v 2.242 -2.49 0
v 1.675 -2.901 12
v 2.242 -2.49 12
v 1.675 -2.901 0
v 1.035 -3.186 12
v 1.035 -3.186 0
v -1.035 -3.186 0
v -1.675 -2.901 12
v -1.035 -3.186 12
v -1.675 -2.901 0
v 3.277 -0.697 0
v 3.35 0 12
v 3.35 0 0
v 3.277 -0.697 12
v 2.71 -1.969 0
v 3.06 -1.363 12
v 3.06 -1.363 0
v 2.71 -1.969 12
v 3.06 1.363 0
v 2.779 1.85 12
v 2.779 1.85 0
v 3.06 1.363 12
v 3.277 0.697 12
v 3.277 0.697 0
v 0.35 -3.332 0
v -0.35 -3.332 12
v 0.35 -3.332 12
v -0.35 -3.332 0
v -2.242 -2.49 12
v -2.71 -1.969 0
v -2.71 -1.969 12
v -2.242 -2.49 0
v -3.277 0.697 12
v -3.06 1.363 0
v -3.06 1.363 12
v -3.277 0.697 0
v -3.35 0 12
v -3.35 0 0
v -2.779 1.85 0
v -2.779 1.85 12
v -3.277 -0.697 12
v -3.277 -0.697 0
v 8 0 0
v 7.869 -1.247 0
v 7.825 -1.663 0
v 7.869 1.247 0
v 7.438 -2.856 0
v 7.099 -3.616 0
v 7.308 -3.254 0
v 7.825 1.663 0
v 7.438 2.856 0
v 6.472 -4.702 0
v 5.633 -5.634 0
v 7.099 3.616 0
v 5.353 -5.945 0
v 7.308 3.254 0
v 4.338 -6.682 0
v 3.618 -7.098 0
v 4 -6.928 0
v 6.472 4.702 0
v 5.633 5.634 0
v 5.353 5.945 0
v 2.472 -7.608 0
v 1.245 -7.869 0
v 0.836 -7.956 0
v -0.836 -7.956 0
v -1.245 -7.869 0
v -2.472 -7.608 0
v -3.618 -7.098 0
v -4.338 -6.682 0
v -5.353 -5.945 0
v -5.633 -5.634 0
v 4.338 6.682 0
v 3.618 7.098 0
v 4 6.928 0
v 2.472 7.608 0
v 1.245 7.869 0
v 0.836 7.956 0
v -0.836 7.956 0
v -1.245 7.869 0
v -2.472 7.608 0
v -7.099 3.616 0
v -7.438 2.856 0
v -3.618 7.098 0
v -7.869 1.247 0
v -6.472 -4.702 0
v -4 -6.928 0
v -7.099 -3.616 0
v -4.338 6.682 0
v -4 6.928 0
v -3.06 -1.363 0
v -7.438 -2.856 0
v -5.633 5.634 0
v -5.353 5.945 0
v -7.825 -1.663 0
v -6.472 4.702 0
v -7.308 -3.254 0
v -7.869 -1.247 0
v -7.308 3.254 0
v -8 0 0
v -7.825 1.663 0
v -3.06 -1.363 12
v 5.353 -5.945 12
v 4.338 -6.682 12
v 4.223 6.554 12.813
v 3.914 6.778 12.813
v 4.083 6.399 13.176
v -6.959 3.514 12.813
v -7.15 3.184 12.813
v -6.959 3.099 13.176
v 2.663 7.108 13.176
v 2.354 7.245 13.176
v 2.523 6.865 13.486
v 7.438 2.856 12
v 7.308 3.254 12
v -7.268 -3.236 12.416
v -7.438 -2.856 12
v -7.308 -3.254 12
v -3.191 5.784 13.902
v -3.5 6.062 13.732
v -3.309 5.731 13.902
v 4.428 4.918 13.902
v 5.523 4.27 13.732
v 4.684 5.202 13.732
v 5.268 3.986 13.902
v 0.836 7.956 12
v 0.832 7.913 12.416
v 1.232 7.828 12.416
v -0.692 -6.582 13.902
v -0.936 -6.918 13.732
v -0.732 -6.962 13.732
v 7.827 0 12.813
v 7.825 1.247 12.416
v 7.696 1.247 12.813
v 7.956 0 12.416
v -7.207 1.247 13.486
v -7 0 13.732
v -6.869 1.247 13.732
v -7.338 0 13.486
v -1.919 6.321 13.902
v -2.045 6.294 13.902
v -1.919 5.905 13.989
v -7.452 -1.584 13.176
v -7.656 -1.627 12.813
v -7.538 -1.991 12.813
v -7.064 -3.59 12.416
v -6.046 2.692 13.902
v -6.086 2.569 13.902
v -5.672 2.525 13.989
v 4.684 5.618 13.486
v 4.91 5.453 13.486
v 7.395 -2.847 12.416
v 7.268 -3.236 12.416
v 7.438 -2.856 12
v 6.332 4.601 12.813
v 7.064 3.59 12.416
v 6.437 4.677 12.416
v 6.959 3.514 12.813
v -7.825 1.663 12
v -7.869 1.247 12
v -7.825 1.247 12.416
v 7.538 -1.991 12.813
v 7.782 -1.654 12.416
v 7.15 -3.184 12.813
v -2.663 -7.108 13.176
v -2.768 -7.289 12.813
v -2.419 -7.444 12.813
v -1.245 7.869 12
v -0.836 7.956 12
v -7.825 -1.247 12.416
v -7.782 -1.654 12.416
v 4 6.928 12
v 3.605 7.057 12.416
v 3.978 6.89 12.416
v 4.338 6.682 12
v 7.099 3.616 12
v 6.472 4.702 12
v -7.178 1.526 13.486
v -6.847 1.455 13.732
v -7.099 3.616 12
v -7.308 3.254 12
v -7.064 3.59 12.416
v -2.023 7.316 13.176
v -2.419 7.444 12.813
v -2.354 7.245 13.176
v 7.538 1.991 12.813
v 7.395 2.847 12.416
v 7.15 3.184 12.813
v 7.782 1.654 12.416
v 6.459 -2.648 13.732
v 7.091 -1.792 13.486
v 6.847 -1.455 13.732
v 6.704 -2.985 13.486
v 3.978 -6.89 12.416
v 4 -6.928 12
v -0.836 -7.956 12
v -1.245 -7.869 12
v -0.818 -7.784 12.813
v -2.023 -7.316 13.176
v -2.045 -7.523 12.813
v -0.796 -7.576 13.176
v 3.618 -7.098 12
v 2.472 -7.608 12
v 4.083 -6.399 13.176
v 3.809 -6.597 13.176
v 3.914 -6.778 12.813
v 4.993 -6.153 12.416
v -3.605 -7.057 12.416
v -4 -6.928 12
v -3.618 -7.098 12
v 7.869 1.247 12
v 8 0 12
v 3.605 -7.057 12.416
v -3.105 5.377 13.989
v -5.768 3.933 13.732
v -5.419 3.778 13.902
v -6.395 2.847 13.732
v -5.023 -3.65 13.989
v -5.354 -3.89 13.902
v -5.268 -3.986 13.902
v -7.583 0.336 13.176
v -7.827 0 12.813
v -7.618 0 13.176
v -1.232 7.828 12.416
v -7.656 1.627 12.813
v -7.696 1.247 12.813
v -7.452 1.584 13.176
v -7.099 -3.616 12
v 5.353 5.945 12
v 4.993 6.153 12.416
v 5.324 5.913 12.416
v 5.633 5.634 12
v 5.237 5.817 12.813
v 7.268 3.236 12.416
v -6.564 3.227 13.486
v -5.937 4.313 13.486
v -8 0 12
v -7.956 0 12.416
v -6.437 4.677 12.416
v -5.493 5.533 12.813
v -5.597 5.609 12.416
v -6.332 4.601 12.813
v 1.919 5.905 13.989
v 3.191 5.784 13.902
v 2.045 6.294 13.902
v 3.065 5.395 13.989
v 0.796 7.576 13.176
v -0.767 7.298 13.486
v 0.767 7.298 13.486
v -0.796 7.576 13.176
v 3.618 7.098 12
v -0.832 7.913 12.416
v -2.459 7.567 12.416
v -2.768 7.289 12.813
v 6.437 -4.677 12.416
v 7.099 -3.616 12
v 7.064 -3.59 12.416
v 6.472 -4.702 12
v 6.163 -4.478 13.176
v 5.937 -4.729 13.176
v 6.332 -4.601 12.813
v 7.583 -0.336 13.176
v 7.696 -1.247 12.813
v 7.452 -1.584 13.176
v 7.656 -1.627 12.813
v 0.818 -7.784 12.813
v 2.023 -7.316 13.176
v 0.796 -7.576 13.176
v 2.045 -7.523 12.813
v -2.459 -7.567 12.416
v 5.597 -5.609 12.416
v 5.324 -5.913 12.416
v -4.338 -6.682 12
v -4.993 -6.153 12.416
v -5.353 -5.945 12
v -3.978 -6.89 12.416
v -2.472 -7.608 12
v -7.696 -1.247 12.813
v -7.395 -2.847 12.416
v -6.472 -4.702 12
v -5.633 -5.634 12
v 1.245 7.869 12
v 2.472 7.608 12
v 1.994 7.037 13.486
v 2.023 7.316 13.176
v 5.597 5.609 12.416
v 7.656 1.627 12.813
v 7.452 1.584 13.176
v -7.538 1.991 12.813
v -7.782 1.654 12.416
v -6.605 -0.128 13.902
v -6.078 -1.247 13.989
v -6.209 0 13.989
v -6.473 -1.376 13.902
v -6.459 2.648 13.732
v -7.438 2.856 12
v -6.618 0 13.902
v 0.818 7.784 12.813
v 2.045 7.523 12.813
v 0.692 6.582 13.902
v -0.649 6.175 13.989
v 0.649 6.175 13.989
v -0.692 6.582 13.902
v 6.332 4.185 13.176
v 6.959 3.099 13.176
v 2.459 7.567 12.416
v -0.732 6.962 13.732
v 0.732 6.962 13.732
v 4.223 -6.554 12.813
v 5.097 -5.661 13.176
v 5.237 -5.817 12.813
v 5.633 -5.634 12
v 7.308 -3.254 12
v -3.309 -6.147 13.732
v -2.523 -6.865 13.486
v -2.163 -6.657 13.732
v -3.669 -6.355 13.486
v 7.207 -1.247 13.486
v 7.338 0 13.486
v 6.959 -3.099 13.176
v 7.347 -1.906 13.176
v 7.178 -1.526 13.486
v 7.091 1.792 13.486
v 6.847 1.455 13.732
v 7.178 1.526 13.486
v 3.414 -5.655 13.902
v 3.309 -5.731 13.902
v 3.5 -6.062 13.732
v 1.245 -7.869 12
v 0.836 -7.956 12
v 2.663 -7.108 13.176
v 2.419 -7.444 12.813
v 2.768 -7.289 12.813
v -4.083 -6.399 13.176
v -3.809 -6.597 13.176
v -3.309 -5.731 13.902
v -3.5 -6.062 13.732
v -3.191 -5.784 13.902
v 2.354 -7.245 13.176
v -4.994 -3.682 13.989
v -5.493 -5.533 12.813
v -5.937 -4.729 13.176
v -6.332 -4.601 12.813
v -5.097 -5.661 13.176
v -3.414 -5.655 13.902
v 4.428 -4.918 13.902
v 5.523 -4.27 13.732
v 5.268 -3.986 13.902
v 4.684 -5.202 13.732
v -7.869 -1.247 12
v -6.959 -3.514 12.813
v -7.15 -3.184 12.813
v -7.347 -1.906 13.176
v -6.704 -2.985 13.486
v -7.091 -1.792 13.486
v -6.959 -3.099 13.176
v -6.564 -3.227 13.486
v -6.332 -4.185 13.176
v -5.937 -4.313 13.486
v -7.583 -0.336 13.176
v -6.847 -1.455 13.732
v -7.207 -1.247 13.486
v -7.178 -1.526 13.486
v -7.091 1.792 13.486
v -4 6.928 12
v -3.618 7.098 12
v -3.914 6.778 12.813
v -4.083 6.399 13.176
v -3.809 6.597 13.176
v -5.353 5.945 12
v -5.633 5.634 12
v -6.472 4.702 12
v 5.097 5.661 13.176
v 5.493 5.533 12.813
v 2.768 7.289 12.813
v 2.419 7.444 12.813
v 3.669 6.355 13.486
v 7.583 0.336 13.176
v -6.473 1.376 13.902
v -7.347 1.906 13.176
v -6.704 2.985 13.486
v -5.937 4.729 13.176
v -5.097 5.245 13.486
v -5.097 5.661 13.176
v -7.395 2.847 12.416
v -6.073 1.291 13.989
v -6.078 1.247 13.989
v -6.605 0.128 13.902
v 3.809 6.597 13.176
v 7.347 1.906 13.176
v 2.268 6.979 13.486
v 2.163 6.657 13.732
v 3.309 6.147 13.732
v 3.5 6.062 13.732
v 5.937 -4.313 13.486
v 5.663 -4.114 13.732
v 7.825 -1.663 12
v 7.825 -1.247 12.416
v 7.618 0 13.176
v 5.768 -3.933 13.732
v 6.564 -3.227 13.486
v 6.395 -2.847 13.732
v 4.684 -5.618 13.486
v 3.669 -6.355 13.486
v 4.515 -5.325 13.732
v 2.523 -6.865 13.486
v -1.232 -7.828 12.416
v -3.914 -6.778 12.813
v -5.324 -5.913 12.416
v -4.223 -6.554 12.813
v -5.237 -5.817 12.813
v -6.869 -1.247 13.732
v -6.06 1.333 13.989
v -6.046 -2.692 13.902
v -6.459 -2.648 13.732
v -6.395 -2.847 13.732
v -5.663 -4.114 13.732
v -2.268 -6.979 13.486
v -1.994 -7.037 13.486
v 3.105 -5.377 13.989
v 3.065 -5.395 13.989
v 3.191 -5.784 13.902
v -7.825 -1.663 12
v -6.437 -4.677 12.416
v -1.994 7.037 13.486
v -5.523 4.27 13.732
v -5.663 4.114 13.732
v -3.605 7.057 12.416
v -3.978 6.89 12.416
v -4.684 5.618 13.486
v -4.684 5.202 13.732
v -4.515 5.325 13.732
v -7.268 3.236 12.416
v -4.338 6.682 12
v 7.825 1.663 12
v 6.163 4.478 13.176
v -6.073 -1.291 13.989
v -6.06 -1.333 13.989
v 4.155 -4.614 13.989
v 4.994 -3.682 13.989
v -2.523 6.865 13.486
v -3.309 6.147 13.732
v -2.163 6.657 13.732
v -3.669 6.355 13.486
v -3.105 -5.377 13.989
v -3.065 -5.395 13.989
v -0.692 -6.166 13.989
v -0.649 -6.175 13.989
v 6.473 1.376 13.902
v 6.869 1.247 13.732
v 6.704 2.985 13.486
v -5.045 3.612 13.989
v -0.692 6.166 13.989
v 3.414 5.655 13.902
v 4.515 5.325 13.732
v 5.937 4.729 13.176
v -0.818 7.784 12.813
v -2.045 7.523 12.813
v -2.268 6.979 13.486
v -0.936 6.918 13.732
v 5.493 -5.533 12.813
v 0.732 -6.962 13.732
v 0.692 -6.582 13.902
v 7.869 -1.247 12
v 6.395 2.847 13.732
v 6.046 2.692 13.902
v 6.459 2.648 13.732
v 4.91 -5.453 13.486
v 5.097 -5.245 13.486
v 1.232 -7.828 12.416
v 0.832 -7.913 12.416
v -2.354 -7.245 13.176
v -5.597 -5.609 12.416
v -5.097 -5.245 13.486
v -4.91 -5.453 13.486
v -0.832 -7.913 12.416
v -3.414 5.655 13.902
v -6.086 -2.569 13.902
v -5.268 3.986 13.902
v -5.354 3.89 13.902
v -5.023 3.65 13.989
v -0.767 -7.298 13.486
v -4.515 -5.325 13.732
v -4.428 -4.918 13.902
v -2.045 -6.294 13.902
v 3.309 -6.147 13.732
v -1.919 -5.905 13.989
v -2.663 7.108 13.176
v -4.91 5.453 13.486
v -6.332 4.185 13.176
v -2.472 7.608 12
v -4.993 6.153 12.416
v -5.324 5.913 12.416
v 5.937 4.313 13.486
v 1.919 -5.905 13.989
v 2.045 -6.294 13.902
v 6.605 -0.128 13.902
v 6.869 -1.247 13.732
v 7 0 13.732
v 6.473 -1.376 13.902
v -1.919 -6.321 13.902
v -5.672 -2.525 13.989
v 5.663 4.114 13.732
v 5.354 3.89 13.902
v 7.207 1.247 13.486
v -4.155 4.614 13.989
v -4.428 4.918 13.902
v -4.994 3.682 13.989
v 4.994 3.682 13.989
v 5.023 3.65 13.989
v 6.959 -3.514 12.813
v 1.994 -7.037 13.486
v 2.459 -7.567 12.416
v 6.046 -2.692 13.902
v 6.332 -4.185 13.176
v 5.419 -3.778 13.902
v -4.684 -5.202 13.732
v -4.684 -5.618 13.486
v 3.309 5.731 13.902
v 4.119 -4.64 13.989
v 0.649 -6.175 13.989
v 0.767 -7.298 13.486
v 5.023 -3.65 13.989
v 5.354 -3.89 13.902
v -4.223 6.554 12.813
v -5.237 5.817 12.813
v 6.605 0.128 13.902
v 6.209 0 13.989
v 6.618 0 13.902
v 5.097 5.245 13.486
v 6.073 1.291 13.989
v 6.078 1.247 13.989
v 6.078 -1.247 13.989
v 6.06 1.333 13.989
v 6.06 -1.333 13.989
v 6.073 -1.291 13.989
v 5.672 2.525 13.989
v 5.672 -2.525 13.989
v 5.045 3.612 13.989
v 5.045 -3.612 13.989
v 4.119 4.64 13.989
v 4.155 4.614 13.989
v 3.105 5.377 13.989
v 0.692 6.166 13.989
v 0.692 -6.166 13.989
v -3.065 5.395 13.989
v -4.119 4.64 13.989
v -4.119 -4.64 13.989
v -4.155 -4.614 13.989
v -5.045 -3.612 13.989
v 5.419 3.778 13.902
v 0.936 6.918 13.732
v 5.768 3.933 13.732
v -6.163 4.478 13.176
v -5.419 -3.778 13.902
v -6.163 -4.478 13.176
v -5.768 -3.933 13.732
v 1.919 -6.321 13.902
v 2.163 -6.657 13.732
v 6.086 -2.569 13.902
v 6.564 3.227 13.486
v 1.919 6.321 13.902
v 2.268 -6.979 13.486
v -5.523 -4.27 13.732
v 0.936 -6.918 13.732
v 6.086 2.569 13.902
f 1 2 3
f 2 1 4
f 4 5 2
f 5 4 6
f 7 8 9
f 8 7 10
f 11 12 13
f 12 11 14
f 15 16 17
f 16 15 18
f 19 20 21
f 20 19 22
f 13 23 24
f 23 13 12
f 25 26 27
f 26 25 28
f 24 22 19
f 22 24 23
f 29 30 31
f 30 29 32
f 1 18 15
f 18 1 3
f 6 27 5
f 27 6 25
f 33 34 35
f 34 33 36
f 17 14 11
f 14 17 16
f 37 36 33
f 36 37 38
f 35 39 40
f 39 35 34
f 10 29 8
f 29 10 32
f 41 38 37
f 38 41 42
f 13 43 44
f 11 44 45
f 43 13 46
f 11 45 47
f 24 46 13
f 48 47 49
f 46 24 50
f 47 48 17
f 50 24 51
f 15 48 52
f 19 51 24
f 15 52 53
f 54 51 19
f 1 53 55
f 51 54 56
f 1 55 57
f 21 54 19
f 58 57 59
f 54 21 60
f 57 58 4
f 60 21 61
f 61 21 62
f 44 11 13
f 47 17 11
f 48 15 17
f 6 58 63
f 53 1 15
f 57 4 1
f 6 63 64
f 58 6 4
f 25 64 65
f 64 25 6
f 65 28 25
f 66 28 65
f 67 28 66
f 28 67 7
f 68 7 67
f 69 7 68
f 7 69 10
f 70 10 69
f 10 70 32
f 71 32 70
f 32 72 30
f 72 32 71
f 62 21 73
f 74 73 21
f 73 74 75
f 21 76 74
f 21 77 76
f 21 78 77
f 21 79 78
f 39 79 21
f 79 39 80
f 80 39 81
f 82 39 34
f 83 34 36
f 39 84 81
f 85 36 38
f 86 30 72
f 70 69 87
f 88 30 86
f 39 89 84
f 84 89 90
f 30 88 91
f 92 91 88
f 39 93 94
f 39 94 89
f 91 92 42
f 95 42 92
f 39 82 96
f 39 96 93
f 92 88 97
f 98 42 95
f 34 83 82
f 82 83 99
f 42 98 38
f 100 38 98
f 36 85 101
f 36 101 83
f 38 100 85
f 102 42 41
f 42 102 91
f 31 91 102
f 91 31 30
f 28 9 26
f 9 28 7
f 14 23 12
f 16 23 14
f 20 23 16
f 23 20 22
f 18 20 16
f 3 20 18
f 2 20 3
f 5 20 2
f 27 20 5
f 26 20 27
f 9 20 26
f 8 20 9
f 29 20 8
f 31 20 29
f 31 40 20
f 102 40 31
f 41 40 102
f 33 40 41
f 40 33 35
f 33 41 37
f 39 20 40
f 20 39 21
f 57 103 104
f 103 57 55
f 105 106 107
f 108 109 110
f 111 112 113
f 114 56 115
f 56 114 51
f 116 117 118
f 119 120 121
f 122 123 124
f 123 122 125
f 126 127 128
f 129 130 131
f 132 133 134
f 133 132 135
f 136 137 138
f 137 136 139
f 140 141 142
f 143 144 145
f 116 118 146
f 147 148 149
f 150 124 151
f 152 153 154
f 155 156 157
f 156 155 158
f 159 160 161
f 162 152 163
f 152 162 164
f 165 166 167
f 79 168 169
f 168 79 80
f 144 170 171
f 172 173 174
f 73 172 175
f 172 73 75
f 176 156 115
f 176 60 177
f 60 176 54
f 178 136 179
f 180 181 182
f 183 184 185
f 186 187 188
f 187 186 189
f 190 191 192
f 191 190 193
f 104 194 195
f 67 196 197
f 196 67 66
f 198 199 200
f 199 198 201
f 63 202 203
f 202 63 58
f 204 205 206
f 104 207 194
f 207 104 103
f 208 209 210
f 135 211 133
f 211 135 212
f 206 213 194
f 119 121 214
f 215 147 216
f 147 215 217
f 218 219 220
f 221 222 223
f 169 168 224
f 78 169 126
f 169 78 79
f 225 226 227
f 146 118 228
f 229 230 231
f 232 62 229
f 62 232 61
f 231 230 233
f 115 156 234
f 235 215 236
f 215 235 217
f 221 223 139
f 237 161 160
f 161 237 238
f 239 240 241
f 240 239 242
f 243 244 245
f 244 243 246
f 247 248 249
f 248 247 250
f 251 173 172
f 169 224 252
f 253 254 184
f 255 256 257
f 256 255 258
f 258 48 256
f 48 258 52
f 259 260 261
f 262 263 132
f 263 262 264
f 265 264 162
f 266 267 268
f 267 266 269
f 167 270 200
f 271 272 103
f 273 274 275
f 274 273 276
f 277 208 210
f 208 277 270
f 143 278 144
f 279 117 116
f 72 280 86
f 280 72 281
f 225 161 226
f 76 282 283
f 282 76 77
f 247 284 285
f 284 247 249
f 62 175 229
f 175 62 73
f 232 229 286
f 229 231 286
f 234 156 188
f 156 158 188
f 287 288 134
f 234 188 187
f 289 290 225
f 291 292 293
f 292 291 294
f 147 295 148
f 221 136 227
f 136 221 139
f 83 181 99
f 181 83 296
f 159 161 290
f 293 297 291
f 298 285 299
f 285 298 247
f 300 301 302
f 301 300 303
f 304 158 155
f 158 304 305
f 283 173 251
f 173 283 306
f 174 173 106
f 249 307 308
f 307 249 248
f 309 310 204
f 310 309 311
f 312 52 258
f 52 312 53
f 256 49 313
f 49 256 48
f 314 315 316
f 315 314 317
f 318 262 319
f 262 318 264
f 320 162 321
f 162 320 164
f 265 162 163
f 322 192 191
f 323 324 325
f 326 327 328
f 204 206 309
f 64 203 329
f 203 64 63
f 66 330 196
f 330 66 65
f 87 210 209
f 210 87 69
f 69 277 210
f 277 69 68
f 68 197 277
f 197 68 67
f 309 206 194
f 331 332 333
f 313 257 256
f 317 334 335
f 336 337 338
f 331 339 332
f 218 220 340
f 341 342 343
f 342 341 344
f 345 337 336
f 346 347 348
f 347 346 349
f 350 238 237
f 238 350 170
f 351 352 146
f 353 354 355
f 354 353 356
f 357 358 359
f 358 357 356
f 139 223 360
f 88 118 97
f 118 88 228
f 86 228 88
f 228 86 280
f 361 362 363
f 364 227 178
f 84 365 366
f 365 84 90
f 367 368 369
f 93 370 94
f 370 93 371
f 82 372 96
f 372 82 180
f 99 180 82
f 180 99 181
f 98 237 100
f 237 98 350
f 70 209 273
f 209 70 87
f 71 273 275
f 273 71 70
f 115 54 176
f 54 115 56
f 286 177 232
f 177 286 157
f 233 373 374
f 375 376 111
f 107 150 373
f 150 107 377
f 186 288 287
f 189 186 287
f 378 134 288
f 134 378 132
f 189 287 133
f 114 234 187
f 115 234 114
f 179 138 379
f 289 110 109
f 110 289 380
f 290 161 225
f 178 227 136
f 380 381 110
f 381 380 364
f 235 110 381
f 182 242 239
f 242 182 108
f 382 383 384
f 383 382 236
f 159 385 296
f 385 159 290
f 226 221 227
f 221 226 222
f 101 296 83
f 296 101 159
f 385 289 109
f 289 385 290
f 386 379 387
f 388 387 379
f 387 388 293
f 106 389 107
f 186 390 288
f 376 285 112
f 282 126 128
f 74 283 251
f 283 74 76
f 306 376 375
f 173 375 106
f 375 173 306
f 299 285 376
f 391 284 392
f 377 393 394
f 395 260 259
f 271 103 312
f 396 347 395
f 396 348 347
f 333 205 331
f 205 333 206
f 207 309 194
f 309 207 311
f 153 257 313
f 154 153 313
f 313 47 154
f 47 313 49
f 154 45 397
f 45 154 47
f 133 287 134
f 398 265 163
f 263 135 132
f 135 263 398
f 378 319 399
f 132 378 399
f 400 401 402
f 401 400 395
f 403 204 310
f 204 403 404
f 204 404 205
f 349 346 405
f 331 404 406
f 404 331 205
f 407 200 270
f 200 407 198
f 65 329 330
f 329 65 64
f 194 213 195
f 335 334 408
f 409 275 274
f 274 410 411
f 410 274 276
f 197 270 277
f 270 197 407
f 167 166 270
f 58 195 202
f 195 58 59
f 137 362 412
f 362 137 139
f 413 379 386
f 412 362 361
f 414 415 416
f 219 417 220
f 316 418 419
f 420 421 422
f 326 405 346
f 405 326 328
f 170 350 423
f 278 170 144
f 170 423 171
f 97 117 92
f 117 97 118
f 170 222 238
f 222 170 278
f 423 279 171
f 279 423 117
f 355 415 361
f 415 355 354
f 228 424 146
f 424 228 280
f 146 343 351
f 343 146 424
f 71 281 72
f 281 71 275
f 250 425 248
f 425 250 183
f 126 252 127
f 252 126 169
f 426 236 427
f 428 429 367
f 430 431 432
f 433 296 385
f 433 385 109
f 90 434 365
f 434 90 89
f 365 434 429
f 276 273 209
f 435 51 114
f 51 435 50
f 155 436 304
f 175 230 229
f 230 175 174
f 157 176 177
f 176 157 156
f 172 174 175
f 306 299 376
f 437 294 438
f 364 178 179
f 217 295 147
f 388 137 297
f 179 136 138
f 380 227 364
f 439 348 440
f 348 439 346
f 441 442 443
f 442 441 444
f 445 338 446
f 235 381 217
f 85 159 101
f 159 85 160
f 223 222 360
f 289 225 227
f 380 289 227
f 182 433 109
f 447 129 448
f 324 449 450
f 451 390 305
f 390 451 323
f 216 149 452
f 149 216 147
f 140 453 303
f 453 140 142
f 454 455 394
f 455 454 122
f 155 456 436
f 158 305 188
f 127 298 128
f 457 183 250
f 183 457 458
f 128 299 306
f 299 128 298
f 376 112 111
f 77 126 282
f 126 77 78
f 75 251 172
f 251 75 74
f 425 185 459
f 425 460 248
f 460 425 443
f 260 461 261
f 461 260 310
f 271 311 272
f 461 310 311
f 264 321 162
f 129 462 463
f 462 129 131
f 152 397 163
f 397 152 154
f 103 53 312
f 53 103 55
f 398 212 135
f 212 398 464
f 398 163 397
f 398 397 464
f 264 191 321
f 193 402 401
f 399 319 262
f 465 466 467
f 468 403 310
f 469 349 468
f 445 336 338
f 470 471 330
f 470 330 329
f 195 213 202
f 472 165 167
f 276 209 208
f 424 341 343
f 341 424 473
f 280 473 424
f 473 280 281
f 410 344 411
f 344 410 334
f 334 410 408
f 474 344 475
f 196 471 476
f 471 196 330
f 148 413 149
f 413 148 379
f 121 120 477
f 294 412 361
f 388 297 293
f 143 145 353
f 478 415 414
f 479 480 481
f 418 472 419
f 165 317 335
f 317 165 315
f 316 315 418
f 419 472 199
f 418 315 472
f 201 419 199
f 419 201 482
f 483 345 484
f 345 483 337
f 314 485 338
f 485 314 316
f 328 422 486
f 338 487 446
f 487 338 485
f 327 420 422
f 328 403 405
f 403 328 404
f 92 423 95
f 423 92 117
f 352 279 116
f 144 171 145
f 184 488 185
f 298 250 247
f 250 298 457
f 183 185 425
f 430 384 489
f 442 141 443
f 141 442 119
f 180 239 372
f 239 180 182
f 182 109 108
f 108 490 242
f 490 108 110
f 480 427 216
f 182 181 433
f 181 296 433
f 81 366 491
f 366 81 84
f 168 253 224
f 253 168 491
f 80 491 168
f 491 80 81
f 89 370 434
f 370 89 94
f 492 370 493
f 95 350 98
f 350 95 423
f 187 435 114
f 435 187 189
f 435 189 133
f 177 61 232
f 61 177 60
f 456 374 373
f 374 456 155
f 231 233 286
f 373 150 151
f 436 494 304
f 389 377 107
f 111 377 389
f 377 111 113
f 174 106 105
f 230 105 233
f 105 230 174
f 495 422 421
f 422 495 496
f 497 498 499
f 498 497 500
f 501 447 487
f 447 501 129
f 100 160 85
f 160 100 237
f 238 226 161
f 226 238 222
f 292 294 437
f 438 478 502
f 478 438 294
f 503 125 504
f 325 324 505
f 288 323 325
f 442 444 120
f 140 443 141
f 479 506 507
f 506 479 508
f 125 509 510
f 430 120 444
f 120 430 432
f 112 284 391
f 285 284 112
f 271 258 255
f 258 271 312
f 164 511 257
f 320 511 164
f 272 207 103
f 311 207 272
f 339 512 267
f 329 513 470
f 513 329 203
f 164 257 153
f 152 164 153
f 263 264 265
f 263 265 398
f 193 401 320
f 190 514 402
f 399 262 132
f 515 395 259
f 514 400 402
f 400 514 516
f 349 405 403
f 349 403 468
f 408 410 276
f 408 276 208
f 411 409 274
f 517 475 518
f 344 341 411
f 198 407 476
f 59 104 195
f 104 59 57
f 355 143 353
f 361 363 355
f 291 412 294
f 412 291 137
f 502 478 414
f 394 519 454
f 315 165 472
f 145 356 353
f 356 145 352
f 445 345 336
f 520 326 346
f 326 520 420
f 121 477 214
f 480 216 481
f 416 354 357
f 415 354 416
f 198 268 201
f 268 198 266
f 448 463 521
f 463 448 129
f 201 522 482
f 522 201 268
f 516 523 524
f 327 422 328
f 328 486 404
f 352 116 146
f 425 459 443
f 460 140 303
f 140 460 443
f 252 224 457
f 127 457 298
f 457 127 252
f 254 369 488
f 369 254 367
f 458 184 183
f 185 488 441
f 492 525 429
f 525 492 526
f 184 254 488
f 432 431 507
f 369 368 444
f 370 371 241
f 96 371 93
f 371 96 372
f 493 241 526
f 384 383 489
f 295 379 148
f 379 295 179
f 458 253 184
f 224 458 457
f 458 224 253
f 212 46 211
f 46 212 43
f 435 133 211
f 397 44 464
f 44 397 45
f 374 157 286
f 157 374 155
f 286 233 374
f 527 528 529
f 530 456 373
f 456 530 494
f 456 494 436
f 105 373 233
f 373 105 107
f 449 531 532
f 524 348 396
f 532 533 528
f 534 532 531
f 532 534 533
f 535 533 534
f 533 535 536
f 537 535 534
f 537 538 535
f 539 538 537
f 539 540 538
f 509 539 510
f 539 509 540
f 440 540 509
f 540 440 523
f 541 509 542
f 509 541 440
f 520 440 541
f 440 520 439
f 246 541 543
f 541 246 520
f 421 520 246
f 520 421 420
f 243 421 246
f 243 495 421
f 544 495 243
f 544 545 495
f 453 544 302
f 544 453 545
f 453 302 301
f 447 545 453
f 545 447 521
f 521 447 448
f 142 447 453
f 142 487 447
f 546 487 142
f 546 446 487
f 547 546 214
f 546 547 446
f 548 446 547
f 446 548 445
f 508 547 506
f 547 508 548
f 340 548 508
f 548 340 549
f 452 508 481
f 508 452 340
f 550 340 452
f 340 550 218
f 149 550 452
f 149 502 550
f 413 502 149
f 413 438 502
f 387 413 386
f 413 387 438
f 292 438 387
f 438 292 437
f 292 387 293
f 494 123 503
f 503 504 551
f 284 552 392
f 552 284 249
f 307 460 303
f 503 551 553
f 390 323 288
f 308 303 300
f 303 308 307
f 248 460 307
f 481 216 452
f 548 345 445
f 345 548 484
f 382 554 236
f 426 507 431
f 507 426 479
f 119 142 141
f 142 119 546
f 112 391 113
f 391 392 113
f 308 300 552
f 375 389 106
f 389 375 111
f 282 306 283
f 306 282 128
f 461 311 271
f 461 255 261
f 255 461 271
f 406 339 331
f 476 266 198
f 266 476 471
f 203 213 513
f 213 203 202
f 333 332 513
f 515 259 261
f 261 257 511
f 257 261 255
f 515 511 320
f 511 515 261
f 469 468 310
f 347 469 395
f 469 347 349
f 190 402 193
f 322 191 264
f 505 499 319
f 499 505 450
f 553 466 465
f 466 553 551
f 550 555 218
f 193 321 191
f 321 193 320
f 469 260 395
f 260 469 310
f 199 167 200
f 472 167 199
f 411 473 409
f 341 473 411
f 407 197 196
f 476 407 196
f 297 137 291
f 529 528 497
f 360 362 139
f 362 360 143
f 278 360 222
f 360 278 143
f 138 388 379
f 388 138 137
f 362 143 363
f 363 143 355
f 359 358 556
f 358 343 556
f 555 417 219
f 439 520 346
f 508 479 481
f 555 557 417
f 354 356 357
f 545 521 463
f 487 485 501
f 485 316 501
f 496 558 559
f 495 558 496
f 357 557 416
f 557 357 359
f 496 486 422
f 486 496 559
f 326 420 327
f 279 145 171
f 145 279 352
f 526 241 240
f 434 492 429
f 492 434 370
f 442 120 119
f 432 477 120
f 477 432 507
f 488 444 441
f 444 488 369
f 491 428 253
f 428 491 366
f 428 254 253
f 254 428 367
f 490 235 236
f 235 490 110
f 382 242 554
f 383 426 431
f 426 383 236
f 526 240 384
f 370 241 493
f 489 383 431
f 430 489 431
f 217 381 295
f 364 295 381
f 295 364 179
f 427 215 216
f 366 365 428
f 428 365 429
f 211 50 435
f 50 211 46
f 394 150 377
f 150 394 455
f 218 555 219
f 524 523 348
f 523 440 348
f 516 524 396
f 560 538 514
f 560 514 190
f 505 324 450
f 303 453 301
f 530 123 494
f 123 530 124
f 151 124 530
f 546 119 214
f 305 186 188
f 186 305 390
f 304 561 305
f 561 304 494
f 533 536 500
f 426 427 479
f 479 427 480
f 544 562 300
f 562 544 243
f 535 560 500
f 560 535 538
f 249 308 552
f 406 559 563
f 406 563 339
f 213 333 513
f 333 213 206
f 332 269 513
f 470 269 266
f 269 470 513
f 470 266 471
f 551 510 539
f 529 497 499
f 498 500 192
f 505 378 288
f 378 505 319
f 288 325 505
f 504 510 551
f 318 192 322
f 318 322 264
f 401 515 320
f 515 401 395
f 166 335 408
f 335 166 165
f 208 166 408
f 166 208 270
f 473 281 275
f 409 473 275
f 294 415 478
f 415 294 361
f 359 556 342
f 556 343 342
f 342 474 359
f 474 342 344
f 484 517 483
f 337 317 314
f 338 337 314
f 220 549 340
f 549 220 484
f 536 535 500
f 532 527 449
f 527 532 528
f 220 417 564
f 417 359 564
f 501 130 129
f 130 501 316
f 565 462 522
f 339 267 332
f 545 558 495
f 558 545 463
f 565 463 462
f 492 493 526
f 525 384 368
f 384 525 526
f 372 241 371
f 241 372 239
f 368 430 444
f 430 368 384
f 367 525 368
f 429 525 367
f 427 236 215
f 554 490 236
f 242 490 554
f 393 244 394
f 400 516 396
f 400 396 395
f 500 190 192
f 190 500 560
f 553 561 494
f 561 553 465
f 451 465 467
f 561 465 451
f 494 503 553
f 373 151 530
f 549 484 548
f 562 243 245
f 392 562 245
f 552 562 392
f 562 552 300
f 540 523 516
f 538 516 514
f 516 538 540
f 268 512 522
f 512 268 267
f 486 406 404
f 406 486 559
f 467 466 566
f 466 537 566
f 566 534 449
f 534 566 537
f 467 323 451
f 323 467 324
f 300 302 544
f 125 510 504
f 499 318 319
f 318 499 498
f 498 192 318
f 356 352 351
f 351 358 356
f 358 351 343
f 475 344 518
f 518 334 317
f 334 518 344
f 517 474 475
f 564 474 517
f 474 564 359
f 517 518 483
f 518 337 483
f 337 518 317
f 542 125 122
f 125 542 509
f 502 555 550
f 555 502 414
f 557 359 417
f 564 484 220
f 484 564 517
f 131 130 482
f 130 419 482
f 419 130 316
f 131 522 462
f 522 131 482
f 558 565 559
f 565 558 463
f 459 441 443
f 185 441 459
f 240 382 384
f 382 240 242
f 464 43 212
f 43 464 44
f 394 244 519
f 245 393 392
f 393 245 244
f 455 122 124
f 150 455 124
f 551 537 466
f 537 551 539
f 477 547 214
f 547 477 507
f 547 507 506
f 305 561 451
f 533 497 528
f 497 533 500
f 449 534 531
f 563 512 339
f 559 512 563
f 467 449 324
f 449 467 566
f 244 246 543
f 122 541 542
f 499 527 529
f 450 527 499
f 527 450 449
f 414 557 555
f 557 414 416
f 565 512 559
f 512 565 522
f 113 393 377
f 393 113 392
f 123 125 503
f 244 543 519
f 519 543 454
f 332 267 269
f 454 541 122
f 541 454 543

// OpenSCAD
$fn=30;
module d(l,d,dd){
    di=d-dd;
    difference(){
    cylinder(l, d/2, d/2);
        translate([-d/2,d/2-di,0])cube([d,d,l]);
    }
}

intersection(){
difference(){
    minkowski(){
cylinder(12, 6,6);
        sphere(2);
    }
d(12, 6+0.7, 4.5+0.7);
}
cylinder(100,100,100);
}
